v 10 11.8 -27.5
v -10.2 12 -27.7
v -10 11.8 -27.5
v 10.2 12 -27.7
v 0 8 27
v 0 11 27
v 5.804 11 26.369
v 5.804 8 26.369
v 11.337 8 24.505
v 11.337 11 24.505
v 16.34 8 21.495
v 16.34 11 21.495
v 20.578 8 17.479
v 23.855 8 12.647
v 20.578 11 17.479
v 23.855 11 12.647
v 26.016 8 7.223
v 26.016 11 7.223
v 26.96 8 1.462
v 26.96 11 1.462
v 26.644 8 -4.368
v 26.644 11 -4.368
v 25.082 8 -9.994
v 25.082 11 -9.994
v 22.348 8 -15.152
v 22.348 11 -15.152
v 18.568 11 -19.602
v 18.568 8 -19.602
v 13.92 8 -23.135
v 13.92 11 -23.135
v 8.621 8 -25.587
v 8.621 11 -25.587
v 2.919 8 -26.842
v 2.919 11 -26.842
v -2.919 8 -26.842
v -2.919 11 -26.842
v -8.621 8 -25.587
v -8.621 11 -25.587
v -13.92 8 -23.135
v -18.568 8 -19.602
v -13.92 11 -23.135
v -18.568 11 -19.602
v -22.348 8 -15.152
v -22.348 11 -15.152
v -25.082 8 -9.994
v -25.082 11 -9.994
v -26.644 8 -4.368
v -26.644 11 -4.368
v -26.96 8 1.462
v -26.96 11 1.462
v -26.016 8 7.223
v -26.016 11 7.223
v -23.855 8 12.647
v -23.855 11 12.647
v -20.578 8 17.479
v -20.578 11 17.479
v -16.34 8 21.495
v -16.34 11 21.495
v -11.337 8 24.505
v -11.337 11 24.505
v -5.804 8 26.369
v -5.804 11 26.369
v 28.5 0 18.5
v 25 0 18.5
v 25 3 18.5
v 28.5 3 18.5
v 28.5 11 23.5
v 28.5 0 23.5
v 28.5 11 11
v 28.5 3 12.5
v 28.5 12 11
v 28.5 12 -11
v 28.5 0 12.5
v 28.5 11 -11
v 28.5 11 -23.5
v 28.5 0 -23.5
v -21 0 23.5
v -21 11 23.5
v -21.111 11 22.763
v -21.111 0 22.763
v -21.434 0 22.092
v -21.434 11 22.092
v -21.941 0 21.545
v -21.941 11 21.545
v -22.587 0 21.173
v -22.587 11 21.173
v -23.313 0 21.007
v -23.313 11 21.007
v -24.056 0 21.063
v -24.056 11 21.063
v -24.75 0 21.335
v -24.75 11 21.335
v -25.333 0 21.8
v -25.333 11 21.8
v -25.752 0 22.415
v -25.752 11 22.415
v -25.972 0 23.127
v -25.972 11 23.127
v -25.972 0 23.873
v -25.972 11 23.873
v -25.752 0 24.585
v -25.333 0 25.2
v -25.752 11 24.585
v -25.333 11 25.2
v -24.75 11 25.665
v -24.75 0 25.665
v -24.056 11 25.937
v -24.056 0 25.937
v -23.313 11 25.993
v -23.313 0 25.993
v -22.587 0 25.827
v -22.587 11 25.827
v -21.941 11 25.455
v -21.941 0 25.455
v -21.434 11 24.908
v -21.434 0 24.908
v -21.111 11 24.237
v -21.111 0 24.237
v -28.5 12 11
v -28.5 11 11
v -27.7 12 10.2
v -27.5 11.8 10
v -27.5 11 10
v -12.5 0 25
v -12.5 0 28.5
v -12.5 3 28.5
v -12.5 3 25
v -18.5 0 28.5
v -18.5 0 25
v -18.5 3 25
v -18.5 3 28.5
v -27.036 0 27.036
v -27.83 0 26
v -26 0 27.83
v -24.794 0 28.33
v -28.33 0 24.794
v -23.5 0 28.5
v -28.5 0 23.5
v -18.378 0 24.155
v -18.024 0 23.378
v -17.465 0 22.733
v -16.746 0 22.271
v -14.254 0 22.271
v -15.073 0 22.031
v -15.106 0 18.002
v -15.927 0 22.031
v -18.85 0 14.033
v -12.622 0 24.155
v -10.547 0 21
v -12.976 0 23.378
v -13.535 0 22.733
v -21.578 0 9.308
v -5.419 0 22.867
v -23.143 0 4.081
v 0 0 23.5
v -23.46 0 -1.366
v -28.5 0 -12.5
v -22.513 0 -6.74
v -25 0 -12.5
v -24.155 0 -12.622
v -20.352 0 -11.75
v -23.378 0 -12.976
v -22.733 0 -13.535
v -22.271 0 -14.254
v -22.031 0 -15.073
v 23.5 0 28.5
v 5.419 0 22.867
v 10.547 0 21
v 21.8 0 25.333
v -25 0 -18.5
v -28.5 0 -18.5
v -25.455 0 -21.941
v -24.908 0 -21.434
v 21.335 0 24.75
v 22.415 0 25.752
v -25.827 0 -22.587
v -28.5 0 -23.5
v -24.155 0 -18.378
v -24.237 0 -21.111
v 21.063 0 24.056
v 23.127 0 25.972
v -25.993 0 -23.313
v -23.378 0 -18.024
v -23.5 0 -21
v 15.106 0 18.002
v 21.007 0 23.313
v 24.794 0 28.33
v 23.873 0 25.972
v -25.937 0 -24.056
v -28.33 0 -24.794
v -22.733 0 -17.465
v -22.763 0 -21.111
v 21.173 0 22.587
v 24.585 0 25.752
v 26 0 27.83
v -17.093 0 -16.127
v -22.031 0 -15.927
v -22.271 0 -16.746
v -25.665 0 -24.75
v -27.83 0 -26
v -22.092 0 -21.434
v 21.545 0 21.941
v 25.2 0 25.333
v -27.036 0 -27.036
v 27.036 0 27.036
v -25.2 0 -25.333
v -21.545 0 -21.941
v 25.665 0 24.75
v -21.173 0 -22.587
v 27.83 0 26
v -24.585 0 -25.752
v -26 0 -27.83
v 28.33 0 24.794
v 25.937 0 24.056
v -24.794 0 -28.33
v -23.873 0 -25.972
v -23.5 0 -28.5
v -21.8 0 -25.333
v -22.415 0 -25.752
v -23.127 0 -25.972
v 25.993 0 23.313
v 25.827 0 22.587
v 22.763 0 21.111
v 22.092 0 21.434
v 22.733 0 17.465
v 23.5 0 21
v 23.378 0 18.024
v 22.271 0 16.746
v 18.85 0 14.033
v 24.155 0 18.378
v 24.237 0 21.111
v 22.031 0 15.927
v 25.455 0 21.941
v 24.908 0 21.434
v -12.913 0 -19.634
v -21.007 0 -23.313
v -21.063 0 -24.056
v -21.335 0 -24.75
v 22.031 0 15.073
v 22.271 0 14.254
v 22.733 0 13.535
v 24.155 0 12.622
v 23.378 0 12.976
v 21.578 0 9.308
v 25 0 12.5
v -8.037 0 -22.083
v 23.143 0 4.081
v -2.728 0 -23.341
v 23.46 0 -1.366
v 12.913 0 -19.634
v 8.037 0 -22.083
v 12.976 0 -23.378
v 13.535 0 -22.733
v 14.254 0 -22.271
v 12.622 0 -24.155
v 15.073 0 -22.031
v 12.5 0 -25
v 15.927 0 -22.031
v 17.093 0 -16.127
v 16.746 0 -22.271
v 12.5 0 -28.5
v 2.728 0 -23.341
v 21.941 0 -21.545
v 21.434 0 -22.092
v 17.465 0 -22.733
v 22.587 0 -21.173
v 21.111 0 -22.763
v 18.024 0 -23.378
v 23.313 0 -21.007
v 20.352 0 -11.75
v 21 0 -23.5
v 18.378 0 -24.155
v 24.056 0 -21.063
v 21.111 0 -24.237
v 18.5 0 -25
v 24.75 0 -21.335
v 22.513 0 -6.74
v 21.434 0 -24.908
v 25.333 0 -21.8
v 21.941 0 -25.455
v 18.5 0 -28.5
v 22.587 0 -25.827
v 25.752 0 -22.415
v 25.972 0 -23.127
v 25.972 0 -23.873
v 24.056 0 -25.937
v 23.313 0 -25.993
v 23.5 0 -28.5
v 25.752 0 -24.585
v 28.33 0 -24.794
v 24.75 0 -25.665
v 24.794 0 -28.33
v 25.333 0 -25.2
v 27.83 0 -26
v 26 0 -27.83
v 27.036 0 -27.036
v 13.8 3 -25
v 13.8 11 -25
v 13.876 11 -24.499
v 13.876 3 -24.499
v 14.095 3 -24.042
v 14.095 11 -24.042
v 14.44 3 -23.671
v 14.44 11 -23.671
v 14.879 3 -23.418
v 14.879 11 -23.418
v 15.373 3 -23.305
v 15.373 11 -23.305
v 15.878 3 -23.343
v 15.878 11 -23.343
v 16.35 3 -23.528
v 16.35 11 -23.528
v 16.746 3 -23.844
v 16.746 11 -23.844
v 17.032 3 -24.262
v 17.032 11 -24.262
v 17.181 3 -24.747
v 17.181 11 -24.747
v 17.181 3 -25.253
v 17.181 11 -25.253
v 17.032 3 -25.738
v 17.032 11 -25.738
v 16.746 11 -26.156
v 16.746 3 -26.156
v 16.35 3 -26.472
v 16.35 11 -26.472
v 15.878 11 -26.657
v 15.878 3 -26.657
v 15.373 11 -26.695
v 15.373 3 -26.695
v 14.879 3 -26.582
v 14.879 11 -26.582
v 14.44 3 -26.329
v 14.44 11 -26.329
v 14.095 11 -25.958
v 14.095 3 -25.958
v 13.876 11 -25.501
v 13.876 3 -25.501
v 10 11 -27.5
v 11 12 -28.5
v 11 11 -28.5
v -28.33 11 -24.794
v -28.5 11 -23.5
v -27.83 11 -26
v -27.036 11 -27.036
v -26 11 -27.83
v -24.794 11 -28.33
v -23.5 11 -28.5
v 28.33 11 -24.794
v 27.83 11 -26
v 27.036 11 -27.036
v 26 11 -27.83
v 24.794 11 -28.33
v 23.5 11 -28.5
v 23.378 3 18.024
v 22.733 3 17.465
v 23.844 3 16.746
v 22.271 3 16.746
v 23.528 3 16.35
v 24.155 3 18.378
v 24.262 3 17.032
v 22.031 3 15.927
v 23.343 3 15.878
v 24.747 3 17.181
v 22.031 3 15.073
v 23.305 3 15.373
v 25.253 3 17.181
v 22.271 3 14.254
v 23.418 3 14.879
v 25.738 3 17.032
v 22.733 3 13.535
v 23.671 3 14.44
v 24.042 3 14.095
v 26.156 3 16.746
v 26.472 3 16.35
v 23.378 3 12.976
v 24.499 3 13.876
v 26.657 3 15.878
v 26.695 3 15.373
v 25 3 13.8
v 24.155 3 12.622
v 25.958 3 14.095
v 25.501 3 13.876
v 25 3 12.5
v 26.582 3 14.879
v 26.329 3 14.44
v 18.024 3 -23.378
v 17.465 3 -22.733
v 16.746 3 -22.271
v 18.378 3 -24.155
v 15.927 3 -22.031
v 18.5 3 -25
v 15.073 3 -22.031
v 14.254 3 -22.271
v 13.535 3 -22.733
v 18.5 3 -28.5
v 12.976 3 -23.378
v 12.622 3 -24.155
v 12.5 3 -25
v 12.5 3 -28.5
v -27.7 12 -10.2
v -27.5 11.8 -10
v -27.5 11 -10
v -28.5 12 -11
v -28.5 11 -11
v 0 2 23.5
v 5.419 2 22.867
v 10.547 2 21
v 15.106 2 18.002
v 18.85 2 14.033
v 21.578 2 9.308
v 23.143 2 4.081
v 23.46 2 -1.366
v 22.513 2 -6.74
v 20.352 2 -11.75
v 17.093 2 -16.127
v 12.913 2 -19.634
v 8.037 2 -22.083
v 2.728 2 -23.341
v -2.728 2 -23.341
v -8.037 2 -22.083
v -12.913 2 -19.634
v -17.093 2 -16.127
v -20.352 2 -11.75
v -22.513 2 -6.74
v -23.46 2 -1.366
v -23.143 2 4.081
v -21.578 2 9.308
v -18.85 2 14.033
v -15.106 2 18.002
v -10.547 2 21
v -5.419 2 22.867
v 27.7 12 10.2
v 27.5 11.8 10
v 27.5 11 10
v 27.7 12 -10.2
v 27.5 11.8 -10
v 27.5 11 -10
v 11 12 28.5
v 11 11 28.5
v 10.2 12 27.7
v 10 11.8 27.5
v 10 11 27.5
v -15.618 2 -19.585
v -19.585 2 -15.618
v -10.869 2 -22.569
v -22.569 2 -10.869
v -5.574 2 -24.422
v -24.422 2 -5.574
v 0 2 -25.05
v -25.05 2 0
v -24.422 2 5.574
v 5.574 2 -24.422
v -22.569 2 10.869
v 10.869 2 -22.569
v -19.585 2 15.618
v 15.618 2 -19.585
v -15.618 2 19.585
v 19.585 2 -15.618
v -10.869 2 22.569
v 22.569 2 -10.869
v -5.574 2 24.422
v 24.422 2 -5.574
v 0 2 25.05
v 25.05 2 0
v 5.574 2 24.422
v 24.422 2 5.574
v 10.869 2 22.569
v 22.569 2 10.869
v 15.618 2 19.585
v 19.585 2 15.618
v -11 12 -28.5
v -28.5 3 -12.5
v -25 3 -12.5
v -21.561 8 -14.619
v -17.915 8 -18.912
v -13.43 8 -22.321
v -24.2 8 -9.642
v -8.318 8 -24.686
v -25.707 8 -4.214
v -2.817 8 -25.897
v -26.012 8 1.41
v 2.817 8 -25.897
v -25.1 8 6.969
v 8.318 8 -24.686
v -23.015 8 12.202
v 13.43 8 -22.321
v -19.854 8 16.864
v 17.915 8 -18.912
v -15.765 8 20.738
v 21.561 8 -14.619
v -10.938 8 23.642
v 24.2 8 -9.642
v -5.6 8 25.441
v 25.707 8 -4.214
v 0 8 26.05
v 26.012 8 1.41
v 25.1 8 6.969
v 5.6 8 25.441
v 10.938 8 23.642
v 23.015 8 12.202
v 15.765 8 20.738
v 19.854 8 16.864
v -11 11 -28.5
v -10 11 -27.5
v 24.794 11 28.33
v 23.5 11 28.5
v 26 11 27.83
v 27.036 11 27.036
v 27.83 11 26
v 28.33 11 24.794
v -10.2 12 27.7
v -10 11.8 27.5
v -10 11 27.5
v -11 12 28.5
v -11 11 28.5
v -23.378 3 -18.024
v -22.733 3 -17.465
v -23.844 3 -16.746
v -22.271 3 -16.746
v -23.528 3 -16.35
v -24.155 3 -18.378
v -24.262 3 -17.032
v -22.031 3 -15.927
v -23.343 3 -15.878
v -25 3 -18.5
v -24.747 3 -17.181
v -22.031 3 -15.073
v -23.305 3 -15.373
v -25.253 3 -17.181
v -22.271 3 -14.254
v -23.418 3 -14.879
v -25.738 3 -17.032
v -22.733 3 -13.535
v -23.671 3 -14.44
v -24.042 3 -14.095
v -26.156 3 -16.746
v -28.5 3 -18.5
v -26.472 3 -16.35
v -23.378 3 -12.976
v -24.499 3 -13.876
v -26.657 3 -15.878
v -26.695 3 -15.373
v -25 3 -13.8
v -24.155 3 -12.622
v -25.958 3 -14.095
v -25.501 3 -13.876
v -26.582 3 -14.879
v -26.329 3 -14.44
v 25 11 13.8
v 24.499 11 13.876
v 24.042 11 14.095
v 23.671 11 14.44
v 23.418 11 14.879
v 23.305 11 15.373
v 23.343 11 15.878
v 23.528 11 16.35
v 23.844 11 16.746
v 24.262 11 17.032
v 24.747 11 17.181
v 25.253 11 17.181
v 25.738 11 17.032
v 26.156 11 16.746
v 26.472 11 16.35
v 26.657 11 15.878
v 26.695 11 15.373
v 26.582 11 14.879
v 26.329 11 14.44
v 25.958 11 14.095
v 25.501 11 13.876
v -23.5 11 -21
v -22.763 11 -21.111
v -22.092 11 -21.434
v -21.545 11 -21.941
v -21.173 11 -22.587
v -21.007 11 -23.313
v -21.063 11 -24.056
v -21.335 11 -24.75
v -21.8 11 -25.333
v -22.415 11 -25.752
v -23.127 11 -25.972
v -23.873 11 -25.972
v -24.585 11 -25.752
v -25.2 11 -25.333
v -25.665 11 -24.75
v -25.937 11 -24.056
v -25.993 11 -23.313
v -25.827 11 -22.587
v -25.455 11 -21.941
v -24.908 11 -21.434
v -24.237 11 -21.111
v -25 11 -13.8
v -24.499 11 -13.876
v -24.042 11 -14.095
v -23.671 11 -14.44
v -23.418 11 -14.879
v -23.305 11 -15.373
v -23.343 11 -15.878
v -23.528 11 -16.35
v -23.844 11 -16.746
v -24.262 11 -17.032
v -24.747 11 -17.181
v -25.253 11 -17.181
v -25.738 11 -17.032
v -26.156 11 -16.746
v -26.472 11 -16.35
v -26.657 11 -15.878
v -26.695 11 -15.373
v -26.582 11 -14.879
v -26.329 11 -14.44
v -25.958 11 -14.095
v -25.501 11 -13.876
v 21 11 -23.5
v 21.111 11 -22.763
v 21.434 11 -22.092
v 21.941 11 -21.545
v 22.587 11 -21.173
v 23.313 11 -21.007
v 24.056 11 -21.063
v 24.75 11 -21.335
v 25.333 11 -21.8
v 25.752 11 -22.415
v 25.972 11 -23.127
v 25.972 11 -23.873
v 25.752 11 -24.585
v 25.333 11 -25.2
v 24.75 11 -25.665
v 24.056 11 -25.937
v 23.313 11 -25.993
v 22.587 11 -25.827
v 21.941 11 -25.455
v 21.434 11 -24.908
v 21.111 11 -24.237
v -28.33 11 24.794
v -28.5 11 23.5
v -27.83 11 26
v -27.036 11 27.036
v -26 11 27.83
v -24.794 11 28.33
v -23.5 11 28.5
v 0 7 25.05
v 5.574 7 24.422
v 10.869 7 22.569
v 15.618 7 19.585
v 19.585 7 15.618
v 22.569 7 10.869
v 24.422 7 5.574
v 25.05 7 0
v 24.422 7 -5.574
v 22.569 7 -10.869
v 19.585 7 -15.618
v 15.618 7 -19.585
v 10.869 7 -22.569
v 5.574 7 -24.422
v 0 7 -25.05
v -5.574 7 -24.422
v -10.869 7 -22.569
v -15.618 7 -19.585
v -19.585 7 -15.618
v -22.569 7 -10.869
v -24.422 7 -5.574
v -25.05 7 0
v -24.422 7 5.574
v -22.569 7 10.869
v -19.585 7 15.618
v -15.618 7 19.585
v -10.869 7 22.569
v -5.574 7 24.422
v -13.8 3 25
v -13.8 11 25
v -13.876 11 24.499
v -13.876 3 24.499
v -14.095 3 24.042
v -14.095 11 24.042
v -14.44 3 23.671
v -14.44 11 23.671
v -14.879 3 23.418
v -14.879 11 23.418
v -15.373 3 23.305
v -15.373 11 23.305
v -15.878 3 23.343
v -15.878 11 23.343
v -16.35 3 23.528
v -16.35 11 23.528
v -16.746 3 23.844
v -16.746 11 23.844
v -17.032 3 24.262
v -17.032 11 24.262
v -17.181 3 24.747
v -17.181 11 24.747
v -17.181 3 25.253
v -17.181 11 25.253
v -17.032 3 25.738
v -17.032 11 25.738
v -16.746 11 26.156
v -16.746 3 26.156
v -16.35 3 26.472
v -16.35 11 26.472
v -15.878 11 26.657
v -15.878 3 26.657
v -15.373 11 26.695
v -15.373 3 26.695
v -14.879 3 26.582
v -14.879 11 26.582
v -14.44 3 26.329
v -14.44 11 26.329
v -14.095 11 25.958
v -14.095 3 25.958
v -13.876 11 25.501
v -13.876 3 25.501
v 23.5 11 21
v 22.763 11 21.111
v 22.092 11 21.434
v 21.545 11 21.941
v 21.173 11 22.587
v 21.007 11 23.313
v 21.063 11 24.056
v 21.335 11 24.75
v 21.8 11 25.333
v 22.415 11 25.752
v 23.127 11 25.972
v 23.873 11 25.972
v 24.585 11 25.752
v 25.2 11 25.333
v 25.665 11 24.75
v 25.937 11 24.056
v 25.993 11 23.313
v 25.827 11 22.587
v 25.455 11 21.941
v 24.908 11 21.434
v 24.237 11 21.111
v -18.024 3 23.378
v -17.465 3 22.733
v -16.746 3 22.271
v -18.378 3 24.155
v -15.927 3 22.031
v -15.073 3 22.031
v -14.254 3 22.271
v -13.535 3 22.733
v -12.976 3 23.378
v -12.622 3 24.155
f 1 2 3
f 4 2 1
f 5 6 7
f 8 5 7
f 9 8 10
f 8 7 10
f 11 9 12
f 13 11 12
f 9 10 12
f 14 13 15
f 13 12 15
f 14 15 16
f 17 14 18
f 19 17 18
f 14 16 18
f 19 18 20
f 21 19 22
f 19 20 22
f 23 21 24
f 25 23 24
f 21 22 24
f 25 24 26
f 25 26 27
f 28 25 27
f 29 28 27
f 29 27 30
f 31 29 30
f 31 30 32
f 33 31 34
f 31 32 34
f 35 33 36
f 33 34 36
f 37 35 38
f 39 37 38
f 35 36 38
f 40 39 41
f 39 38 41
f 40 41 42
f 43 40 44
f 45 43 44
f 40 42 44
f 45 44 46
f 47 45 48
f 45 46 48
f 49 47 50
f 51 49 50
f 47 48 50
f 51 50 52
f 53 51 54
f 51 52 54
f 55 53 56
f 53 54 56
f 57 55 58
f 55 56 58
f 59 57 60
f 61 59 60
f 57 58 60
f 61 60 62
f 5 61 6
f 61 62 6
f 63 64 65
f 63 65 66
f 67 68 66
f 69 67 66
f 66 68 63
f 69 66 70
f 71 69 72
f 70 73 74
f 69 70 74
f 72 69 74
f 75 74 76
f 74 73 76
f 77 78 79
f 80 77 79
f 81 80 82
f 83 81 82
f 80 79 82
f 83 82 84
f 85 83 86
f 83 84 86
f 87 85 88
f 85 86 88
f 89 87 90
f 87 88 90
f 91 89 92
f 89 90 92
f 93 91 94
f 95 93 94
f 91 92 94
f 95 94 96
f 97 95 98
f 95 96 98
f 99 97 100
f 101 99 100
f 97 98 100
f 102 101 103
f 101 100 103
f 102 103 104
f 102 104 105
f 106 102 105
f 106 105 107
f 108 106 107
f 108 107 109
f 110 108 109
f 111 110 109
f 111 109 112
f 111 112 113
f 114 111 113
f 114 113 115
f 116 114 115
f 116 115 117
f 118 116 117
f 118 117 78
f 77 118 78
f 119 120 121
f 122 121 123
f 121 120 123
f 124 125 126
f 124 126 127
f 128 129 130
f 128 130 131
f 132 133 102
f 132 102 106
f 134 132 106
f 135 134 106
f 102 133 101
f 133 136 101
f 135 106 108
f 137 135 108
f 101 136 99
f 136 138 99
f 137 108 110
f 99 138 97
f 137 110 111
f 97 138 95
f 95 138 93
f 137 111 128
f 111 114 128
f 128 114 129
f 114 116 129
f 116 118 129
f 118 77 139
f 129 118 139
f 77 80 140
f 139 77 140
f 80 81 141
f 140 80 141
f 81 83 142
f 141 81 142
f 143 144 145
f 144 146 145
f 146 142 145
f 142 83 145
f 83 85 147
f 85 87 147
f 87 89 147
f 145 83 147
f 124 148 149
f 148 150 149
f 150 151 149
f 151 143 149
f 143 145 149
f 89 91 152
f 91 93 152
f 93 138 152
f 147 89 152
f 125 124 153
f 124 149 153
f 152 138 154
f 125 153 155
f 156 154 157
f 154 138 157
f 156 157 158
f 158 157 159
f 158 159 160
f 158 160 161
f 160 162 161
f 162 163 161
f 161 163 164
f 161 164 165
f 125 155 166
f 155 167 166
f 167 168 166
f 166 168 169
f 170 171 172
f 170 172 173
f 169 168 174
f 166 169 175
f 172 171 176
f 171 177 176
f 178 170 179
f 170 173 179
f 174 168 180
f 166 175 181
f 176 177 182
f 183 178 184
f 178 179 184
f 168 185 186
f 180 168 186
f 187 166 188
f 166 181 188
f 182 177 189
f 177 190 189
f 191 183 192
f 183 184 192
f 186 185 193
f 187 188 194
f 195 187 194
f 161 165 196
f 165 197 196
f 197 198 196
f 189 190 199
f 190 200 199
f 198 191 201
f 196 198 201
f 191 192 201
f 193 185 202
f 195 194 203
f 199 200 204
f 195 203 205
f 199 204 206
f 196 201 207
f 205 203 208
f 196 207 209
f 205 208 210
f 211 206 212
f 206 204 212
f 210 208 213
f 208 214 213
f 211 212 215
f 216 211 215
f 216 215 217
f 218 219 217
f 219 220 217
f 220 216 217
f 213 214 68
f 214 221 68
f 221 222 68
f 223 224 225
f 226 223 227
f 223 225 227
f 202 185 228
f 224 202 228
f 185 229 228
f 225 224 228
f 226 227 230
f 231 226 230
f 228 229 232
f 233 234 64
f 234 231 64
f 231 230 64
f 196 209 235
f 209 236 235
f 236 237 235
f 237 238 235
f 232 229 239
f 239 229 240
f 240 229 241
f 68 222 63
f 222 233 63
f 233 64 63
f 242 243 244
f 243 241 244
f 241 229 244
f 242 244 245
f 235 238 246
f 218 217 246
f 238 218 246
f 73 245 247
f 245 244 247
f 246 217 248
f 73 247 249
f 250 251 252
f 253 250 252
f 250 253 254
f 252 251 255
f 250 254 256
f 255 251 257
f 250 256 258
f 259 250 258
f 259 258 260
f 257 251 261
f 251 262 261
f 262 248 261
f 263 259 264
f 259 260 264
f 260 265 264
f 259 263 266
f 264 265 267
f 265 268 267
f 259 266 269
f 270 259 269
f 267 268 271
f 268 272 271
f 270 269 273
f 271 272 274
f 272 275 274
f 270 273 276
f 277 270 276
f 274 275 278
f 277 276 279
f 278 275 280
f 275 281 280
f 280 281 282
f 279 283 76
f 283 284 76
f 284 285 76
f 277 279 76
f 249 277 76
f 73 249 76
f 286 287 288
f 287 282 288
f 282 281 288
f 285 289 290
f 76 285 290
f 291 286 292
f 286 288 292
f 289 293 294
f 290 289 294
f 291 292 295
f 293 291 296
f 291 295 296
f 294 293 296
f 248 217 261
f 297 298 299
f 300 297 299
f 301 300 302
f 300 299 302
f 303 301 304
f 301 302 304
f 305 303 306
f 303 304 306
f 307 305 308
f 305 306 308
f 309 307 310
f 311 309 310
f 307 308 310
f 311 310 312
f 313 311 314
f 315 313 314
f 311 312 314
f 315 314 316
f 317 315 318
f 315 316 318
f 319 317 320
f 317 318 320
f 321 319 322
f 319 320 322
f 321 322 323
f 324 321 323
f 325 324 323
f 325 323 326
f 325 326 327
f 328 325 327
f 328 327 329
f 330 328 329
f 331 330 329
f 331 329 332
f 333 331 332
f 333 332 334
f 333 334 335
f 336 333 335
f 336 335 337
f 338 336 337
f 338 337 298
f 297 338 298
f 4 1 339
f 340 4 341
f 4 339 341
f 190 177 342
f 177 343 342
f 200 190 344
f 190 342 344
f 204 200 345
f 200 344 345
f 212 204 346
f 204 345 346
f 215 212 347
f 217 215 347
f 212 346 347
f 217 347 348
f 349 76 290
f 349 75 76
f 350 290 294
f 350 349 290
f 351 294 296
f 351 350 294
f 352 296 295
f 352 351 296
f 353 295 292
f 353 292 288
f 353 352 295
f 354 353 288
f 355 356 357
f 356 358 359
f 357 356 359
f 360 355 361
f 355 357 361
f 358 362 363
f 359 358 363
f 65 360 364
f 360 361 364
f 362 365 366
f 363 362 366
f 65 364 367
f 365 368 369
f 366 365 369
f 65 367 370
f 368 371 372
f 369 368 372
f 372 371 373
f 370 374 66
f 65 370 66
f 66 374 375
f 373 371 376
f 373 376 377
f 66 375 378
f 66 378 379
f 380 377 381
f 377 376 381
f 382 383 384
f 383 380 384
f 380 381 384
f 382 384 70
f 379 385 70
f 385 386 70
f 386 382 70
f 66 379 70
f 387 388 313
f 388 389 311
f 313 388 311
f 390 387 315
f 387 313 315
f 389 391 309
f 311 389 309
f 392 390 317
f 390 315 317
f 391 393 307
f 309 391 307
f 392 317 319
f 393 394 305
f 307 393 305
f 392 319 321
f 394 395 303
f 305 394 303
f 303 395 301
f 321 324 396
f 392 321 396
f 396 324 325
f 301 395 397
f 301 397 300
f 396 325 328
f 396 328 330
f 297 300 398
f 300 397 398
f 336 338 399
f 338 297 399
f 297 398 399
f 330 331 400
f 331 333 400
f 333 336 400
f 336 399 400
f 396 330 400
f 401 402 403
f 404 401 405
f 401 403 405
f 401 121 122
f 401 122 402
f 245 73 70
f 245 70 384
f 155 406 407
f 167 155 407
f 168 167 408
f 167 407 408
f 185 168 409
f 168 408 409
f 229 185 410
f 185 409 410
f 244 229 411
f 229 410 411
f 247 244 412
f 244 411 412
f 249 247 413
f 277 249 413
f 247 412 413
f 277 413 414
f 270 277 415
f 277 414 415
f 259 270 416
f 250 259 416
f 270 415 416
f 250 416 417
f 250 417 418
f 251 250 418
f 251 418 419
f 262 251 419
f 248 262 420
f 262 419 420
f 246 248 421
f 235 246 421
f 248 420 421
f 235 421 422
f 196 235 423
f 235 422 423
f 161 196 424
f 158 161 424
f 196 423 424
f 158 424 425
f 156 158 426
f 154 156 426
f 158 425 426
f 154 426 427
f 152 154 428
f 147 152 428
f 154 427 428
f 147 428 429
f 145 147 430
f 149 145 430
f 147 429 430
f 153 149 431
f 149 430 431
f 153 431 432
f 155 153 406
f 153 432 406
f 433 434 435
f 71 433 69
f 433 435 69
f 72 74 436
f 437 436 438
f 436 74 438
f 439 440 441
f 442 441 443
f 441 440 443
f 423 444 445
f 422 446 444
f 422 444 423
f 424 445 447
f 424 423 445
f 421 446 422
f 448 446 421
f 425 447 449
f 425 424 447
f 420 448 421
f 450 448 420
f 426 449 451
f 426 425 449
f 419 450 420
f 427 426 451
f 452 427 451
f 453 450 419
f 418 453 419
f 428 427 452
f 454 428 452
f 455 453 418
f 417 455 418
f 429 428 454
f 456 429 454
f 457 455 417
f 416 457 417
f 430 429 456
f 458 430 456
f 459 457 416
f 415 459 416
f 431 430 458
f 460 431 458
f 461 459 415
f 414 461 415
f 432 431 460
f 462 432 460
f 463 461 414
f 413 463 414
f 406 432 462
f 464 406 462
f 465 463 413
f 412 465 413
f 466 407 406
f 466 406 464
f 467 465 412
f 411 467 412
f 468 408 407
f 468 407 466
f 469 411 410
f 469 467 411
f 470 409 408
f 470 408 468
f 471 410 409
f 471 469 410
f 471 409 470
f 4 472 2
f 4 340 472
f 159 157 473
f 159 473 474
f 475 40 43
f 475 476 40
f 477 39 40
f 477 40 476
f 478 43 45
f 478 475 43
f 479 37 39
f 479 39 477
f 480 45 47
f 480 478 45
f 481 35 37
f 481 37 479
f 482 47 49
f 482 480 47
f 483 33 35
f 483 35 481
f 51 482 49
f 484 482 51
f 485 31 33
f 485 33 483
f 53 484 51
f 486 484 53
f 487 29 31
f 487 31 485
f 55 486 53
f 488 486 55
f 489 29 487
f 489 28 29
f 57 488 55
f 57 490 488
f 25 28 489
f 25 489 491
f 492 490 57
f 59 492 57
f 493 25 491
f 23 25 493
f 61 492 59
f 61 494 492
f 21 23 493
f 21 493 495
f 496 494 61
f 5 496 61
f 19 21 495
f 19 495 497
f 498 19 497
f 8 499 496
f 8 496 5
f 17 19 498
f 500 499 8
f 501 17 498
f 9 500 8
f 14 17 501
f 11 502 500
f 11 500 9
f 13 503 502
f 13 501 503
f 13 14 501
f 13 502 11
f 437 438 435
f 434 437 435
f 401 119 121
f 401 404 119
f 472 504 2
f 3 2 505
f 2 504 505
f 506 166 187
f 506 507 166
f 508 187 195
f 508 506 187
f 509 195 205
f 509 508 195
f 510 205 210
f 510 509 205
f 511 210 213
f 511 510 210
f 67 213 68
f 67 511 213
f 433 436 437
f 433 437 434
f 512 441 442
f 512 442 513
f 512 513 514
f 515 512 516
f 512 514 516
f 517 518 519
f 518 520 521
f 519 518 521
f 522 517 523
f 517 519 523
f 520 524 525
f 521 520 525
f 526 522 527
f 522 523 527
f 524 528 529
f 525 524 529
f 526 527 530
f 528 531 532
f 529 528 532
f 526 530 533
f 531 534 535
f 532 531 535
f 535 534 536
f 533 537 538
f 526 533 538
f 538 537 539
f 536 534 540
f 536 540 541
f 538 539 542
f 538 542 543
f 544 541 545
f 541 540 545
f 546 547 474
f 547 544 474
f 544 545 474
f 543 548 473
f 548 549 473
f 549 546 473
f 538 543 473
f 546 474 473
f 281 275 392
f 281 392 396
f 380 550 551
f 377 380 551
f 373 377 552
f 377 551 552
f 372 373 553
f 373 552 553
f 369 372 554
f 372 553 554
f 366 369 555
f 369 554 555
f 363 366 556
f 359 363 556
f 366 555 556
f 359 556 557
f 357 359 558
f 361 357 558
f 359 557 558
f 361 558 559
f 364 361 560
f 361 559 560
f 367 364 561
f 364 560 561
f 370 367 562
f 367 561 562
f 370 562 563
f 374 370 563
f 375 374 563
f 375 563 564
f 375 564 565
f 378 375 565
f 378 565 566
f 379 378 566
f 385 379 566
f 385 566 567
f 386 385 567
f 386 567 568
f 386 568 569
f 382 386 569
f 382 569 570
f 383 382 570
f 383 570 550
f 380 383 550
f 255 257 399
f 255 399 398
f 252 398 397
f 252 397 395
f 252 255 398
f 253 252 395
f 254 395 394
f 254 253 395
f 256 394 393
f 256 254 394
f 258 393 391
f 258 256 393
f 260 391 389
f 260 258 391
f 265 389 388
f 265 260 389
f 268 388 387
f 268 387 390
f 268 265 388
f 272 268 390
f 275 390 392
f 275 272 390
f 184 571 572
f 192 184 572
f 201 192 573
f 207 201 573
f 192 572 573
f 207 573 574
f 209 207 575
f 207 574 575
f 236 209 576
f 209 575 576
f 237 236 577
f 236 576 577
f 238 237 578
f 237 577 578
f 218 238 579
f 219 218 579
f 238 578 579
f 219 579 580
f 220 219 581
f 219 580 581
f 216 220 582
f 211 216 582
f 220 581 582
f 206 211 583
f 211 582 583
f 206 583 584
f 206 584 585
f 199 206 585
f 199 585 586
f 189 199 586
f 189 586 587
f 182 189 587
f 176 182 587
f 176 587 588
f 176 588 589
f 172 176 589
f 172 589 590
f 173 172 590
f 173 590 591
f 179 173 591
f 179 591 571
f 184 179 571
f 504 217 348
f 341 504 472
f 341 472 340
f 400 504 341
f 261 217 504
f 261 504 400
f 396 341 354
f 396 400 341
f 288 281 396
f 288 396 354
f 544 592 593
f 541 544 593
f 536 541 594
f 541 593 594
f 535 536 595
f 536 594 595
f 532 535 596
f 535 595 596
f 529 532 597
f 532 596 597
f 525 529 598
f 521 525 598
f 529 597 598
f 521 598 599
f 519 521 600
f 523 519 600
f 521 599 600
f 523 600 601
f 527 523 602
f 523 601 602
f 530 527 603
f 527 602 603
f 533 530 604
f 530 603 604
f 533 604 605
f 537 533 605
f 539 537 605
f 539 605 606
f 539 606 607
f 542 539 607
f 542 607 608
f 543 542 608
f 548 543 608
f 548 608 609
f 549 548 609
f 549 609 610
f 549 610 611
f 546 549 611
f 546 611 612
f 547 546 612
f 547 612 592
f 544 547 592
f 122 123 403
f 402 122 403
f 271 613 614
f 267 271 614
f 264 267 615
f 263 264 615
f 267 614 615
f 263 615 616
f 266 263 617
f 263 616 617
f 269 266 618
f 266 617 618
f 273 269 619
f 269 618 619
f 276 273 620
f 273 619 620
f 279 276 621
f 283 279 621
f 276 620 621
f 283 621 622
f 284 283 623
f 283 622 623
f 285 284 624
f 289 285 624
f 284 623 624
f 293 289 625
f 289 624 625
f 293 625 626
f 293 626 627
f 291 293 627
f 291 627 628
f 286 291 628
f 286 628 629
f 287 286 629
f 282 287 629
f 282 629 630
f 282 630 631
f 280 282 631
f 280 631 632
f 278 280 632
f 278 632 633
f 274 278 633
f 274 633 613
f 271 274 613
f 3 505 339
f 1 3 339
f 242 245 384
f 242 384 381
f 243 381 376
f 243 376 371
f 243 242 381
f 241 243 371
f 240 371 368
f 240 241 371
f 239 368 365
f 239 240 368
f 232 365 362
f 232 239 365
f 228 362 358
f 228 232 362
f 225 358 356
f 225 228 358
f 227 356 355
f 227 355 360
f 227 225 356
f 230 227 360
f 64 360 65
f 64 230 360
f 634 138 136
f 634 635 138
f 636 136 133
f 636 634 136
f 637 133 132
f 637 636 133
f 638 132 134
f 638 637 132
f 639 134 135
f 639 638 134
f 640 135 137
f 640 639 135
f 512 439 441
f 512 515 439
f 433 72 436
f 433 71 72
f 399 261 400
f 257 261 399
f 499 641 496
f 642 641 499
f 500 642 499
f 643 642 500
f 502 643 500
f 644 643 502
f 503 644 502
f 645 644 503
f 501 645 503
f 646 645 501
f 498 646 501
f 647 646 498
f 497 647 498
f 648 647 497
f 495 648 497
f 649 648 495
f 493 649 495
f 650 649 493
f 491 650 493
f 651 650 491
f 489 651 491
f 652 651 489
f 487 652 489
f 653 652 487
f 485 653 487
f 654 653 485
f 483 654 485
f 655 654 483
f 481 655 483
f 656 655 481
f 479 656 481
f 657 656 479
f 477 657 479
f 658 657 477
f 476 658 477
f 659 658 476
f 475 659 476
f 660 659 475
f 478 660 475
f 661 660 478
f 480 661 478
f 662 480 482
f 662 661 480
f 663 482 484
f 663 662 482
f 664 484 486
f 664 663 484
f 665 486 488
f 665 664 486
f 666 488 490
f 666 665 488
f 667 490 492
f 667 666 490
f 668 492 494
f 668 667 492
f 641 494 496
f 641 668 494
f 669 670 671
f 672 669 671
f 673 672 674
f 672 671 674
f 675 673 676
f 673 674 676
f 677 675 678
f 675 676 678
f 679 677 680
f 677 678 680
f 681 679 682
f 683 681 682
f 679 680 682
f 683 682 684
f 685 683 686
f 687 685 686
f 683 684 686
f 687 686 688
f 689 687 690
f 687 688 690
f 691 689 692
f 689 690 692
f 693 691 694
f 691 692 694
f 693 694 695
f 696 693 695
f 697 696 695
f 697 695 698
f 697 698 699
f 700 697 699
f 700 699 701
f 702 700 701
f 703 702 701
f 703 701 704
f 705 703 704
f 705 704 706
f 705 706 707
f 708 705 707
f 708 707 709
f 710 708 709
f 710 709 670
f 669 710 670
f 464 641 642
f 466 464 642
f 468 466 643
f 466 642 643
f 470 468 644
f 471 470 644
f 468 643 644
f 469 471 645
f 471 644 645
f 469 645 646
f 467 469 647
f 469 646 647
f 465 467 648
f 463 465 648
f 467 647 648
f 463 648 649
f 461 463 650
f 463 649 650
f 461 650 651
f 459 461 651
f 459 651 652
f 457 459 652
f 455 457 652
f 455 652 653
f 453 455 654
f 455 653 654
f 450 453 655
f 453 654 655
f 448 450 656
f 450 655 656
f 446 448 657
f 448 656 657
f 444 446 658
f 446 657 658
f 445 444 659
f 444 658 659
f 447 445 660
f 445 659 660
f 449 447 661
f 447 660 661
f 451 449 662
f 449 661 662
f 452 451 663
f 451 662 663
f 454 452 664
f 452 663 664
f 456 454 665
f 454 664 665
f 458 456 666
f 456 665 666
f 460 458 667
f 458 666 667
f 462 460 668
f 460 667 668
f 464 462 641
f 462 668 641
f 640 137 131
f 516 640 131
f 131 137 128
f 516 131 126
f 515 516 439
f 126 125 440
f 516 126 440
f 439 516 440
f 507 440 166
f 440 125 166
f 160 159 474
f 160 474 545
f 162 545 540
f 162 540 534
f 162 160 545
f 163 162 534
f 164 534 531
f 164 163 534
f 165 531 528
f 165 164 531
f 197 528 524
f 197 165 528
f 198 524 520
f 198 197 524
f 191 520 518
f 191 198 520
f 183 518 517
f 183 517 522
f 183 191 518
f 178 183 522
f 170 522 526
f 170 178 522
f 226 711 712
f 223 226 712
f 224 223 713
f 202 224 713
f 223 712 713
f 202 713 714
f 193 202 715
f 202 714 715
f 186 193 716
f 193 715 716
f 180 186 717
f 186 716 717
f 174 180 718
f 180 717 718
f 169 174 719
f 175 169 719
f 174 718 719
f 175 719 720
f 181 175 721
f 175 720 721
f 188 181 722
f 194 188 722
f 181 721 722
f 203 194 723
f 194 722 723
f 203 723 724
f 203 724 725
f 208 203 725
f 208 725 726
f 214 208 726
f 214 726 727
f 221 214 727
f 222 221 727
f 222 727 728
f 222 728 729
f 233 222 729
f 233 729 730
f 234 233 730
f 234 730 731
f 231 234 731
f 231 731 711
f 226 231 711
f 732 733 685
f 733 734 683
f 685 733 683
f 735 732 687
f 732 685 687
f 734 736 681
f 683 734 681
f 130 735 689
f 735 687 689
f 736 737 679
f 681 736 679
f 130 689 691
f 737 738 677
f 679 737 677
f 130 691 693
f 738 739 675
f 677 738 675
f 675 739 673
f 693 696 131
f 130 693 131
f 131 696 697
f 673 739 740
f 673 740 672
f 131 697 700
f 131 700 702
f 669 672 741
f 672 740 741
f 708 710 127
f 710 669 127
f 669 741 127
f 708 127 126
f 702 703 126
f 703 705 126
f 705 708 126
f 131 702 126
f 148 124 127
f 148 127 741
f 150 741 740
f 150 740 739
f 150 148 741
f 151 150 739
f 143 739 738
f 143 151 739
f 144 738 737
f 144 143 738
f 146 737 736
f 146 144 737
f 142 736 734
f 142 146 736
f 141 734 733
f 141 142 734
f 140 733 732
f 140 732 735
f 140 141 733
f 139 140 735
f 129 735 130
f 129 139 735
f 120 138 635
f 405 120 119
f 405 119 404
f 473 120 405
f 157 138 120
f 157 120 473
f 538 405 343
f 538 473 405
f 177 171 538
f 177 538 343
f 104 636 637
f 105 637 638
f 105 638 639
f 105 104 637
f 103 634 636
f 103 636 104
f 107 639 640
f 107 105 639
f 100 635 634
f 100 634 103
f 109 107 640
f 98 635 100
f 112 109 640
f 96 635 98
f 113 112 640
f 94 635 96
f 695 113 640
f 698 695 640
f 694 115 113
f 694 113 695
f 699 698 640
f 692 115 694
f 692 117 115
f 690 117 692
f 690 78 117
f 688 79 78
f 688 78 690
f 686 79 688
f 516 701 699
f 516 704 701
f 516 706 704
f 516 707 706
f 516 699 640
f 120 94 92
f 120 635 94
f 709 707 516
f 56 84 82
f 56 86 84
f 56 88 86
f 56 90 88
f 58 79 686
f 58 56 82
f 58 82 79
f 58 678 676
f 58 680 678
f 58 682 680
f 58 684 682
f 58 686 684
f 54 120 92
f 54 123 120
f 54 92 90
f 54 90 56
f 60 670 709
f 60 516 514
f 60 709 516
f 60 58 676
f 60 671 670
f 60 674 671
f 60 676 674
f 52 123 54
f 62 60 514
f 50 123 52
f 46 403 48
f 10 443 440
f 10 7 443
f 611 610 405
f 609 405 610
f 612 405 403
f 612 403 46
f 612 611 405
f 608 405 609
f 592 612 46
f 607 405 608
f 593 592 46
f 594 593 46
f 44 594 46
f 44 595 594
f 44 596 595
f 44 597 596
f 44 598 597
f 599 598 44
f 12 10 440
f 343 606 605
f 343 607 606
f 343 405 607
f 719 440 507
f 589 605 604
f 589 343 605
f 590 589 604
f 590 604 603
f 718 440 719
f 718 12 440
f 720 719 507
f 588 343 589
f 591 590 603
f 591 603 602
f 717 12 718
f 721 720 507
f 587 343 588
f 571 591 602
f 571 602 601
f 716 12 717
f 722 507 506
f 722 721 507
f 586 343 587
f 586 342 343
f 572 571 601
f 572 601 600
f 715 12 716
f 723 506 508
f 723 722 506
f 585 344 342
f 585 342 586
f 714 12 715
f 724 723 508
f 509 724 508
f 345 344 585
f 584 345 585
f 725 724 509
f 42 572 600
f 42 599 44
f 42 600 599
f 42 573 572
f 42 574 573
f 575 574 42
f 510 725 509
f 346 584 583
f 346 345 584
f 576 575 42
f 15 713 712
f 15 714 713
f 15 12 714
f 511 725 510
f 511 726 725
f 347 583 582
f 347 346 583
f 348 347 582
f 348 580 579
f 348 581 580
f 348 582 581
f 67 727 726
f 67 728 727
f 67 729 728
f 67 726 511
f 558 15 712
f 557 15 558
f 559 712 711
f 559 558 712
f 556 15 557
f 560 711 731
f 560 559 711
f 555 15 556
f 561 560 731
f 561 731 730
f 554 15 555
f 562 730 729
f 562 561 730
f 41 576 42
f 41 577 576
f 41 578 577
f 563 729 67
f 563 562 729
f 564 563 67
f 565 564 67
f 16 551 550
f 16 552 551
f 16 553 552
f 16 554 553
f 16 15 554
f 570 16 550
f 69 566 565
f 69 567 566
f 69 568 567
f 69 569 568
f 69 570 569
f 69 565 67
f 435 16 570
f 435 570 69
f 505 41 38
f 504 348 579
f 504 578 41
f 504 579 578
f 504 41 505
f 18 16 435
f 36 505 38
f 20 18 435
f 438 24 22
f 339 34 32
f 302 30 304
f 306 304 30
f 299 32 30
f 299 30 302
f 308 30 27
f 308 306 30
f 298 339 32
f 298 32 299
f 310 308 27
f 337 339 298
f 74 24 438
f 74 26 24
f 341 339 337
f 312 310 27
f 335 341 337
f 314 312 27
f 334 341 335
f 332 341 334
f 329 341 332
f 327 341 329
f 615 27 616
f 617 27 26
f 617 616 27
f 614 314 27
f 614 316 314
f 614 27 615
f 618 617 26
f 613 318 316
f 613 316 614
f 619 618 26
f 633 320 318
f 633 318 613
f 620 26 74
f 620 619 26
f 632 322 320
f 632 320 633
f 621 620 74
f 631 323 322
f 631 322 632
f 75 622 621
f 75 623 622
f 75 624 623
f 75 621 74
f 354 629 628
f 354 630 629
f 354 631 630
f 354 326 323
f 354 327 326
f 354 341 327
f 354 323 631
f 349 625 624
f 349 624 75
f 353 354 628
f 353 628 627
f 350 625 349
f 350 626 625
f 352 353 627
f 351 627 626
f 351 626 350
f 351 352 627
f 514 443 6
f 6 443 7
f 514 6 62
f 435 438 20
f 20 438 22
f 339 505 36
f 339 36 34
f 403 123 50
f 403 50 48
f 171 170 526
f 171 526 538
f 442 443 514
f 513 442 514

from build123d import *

# Parameters (mm, degrees)
SKETCH_1_W                           = 57
SKETCH_1_H                           = 57
EXTRUDE_1_DEPTH                      = 11
FILLET_1_R                           = 5
SKETCH_2_R                           = 27
CUT_EXTRUDE_1_DEPTH                  = 3
SKETCH_3_R                           = 25.05
CUT_EXTRUDE_2_DEPTH                  = 6
SKETCH_4_R                           = 23.5
CUT_EXTRUDE_3_DEPTH                  = 2
CHAMFER_1_SIZE                       = 1
SKETCH_5_R                           = 2.5
SKETCH_5_R_2                         = 1.7
CUT_EXTRUDE_4_DEPTH                  = 42.779181419
EXTRUDE_2_DEPTH                      = 1
CHAMFER_2_SIZE                       = 0.2
CUT_EXTRUDE_5_DEPTH                  = 3
PATTERN_CIRCULAR_1_COUNT             = 4
CHAMFER_2_OF_PATTERN_CIRCULAR_1_SIZE = 0.2


with BuildPart() as part:
    # 草图1 → 凸台-拉伸1 (new body)
    with BuildSketch(Plane(origin=(0, 0, 0), x_dir=(1, 0, 0), z_dir=(0, 1, 0))):
        Rectangle(SKETCH_1_W, SKETCH_1_H)
    extrude(amount=EXTRUDE_1_DEPTH)

    # 圆角1
    fillet_1_edges = [part.edges().sort_by_distance(p)[0] for p in [
        (28.5, 5.5, 28.5),
        (-28.5, 5.5, 28.5),
        (-28.5, 5.5, -28.5),
        (28.5, 5.5, -28.5),
    ]]
    fillet(fillet_1_edges, radius=FILLET_1_R)

    # 草图2 → 切除-拉伸1 (cut)
    with BuildSketch(Plane(origin=(0, 11, 0), x_dir=(1, 0, 0), z_dir=(0, 1, 0))):
        with Locations(Location((0, 0, 0), (0, 0, 270))):
            Circle(SKETCH_2_R)
    extrude(amount=-CUT_EXTRUDE_1_DEPTH, mode=Mode.SUBTRACT)

    # 草图3 → 切除-拉伸2 (cut)
    with BuildSketch(Plane(origin=(0, 8, 0), x_dir=(1, 0, 0), z_dir=(0, 1, 0))):
        with Locations(Location((0, 0, 0), (0, 0, 270))):
            Circle(SKETCH_3_R)
    extrude(amount=-CUT_EXTRUDE_2_DEPTH, mode=Mode.SUBTRACT)

    # 草图4 → 切除-拉伸3 (cut)
    with BuildSketch(Plane(origin=(0, 2, 0), x_dir=(1, 0, 0), z_dir=(0, 1, 0))):
        with Locations(Location((0, 0, 0), (0, 0, 270))):
            Circle(SKETCH_4_R)
    extrude(amount=-CUT_EXTRUDE_3_DEPTH, mode=Mode.SUBTRACT)

    # 倒角1
    chamfer_1_edges = [part.edges().sort_by_distance(p)[0] for p in [
        (0, 8, -25.05),
    ]]
    chamfer(chamfer_1_edges, length=CHAMFER_1_SIZE)

    # 草图5 → 切除-拉伸4 (cut, through all)
    with BuildSketch(Plane(origin=(0, 11, 0), x_dir=(1, 0, 0), z_dir=(0, 1, 0))):
        with Locations(Location((-23.5, 23.5, 0), (0, 0, 270))):
            Circle(SKETCH_5_R)
        with Locations(Location((-25, 15.5, 0), (0, 0, 270))):
            Circle(SKETCH_5_R_2)
    cut_extrude_4 = extrude(amount=-CUT_EXTRUDE_4_DEPTH, mode=Mode.SUBTRACT)

    # 草图6 → 凸台-拉伸2 (add)
    with BuildSketch(Plane(origin=(0, 11, 0), x_dir=(1, 0, 0), z_dir=(0, 1, 0))):
        Polygon((-28.5, 11), (-28.5, -11), (-27.5, -10), (-27.5, 10), align=None)
    extrude_2 = extrude(amount=EXTRUDE_2_DEPTH)

    # 倒角2
    chamfer_2_edges = [part.edges().sort_by_distance(p)[0] for p in [
        (-27.5, 12, 0),
    ]]
    chamfer(chamfer_2_edges, length=CHAMFER_2_SIZE)

    # 草图7 → 切除-拉伸5 (cut)
    with BuildSketch(Plane.XZ):
        with BuildLine():
            Line((-25, -18.5), (-30.818208661, -18.5))
            ThreePointArc((-30.818208661, -18.5), (-33.818208661, -15.5), (-30.818208661, -12.5))
            Line((-30.818208661, -12.5), (-25, -12.5))
            ThreePointArc((-25, -12.5), (-22, -15.5), (-25, -18.5))
        make_face()
    cut_extrude_5 = extrude(amount=-CUT_EXTRUDE_5_DEPTH, mode=Mode.SUBTRACT)

    # 阵列(圆周)1: 切除-拉伸4, 凸台-拉伸2, 切除-拉伸5 ×4 about axis
    pattern_circular_1_axis = Axis((0, 0, 0), (0, 1, 0))
    add([cut_extrude_4.rotate(pattern_circular_1_axis, i * 360 / PATTERN_CIRCULAR_1_COUNT) for i in range(1, PATTERN_CIRCULAR_1_COUNT)], mode=Mode.SUBTRACT)
    add([extrude_2.rotate(pattern_circular_1_axis, i * 360 / PATTERN_CIRCULAR_1_COUNT) for i in range(1, PATTERN_CIRCULAR_1_COUNT)])
    add([cut_extrude_5.rotate(pattern_circular_1_axis, i * 360 / PATTERN_CIRCULAR_1_COUNT) for i in range(1, PATTERN_CIRCULAR_1_COUNT)], mode=Mode.SUBTRACT)

    # 倒角2 of 阵列(圆周)1
    chamfer_2_of_pattern_circular_1_edges = [part.edges().sort_by_distance(p)[0] for p in [
        (0, 12, 27.5),
        (27.5, 12, 0),
        (0, 12, -27.5),
    ]]
    chamfer(chamfer_2_of_pattern_circular_1_edges, length=CHAMFER_2_OF_PATTERN_CIRCULAR_1_SIZE)


solid = part.part
